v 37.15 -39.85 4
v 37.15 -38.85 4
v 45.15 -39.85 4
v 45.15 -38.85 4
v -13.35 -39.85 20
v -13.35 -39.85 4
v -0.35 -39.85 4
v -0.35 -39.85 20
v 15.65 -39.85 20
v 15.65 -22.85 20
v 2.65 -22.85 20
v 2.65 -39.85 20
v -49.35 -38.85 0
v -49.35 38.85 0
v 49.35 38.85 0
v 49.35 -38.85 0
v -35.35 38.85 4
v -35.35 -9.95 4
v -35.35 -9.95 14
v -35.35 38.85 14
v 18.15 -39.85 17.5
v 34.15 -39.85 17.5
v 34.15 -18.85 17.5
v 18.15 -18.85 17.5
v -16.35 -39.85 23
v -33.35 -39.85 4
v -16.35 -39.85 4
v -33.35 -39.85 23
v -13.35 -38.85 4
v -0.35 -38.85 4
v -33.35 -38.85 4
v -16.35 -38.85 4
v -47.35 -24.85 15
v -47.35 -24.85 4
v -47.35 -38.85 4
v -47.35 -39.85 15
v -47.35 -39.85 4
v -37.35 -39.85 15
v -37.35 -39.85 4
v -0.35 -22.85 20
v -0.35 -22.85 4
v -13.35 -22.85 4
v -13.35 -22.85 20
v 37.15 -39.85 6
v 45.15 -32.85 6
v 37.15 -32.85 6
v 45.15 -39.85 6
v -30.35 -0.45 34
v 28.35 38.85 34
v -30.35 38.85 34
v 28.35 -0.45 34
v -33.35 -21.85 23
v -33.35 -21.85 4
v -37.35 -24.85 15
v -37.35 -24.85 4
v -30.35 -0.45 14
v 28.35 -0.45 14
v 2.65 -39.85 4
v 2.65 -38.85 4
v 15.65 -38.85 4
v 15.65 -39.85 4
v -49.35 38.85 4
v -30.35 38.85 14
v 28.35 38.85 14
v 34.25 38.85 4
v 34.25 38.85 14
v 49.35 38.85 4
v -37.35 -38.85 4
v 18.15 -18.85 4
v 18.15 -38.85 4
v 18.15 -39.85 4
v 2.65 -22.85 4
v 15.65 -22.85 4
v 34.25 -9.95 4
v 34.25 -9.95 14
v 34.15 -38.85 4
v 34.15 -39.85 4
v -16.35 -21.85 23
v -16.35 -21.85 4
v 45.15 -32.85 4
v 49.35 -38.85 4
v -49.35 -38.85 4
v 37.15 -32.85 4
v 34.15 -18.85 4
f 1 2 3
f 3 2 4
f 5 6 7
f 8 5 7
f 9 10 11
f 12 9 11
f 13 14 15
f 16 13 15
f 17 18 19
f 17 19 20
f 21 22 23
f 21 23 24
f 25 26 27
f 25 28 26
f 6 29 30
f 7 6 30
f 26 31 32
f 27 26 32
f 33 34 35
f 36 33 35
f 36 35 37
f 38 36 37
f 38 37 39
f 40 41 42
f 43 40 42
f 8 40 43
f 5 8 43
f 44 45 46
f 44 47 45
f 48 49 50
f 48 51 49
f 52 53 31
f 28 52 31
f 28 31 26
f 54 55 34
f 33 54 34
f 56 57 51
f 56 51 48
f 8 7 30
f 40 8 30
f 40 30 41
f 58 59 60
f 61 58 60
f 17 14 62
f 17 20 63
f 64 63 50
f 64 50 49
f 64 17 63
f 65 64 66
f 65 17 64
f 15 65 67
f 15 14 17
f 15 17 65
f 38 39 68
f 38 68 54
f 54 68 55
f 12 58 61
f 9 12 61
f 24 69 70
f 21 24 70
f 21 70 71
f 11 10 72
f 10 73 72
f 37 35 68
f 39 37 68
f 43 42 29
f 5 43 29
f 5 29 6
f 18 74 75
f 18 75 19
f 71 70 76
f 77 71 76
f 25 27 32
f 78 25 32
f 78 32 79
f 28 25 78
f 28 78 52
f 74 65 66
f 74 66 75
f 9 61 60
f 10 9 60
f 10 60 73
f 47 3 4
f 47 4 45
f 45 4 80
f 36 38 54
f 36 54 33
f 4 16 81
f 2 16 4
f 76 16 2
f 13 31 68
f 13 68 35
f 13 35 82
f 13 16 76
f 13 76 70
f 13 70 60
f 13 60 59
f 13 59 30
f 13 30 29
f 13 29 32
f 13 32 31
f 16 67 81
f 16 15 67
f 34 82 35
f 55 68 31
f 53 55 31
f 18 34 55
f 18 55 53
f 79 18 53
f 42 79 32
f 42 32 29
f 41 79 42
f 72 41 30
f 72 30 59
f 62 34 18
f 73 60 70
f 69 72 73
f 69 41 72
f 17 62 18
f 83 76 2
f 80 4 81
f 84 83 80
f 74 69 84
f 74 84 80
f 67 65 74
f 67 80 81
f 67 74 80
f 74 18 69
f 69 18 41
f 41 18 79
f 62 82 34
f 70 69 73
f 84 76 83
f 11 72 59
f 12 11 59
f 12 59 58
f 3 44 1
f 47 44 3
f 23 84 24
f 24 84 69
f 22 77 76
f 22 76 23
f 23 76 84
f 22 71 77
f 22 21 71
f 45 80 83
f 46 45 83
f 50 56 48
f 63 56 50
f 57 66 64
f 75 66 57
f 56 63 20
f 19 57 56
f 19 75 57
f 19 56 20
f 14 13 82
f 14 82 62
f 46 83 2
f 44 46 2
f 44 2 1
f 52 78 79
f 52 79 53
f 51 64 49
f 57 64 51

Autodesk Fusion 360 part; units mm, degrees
sketch "Sketch1" plane through (0, 0, 0) normal (0, 0, 1) x (1, 0, 0)
  line L0 (49.35, -38.85) -> (-49.35, -38.85)
  line L1 (-49.35, -38.85) -> (-49.35, 38.85)
  line L2 (-49.35, 38.85) -> (49.35, 38.85)
  line L3 (49.35, 38.85) -> (49.35, -38.85)
  line L4 (49.35, -38.85) -> (-49.35, 38.85) construction
  line L5 (-49.35, -38.85) -> (49.35, 38.85) construction
  dimension "d1" = 98.7
  dimension "d2" = 77.7
extrude "Extrude1" add sketch "Sketch1" along normal blind 4
sketch "Sketch2" plane through (0, 0, 4) normal (0, 0, 1) x (-1, 0, 0)
  line L0 (-49.35, -38.85) -> (49.35, -38.85)
  line L1 (49.35, -38.85) -> (49.35, 38.85)
  line L2 (49.35, 38.85) -> (-49.35, 38.85)
  line L3 (-49.35, 38.85) -> (-49.35, -38.85)
  line L4 (35.35, -38.85) -> (-34.25, -38.85)
  line L5 (-34.25, -38.85) -> (-34.25, 9.95)
  line L6 (-34.25, 9.95) -> (35.35, 9.95)
  line L7 (35.35, 9.95) -> (35.35, -38.85)
  dimension "d5" = 69.6
  dimension "d6" = 48.8
  dimension "d7" = 14
extrude "Extrude2" add sketch "Sketch2" along normal blind 10 contours L0 L4 L5 L6 L7
sketch "Sketch3" plane through (0, 0, 14) normal (0, 0, 1) x (-1, 0, 0)
  line L0 (35.35, 9.95) -> (-34.25, 9.95)
  line L1 (-34.25, 9.95) -> (-34.25, -38.85)
  line L2 (-34.25, -38.85) -> (35.35, -38.85)
  line L3 (35.35, -38.85) -> (35.35, 9.95)
  line L4 (30.35, -38.85) -> (-28.35, -38.85)
  line L5 (-28.35, -38.85) -> (-28.35, 0.45)
  line L6 (-28.35, 0.45) -> (30.35, 0.45)
  line L7 (30.35, 0.45) -> (30.35, -38.85)
  dimension "d10" = 39.3
  dimension "d11" = 58.7
  dimension "d12" = 5
extrude "Extrude3" add sketch "Sketch3" along normal blind 20 contours L2 L4 L5 L6 L7
sketch "Sketch4" plane through (0, 0, 4) normal (0, 0, 1) x (-1, 0, 0)
  line L0 (-34.25, -38.85) -> (-34.25, 9.95)
  line L1 (-34.25, 9.95) -> (35.35, 9.95)
  line L2 (35.35, 9.95) -> (35.35, -38.85)
  line L3 (35.35, -38.85) -> (49.35, -38.85)
  line L4 (49.35, -38.85) -> (49.35, 38.85)
  line L5 (49.35, 38.85) -> (-49.35, 38.85)
  line L6 (-49.35, 38.85) -> (-49.35, -38.85)
  line L7 (-49.35, -38.85) -> (-34.25, -38.85)
  line L8 (47.35, 38.85) -> (37.35, 38.85)
  line L9 (37.35, 38.85) -> (37.35, 24.85)
  line L10 (37.35, 24.85) -> (47.35, 24.85)
  line L11 (47.35, 24.85) -> (47.35, 38.85)
  line L12 (33.35, 38.85) -> (16.35, 38.85)
  line L13 (16.35, 38.85) -> (16.35, 21.85)
  line L14 (16.35, 21.85) -> (33.35, 21.85)
  line L15 (33.35, 21.85) -> (33.35, 38.85)
  line L16 (13.35, 38.85) -> (0.35, 38.85)
  line L17 (0.35, 38.85) -> (0.35, 22.85)
  line L18 (0.35, 22.85) -> (13.35, 22.85)
  line L19 (13.35, 22.85) -> (13.35, 38.85)
  line L20 (-2.65, 38.85) -> (-15.65, 38.85)
  line L21 (-15.65, 38.85) -> (-15.65, 22.85)
  line L22 (-15.65, 22.85) -> (-2.65, 22.85)
  line L23 (-2.65, 22.85) -> (-2.65, 38.85)
  line L24 (-18.15, 38.85) -> (-34.15, 38.85)
  line L25 (-34.15, 38.85) -> (-34.15, 18.85)
  line L26 (-34.15, 18.85) -> (-18.15, 18.85)
  line L27 (-18.15, 18.85) -> (-18.15, 38.85)
  line L28 (-37.15, 38.85) -> (-45.15, 38.85)
  line L29 (-45.15, 38.85) -> (-45.15, 32.85)
  line L30 (-45.15, 32.85) -> (-37.15, 32.85)
  line L31 (-37.15, 32.85) -> (-37.15, 38.85)
  dimension "d15" = 10
  dimension "d16" = 14
  dimension "d17" = 17
  dimension "d18" = 17
  dimension "d19" = 2
  dimension "d20" = 4
  dimension "d21" = 13
  dimension "d22" = 16
  dimension "d23" = 13
  dimension "d24" = 16
  dimension "d25" = 3
  dimension "d26" = 3
  dimension "d27" = 16
  dimension "d28" = 20
  dimension "d29" = 2.5
  dimension "d30" = 8
  dimension "d31" = 6
  dimension "d32" = 3
extrude "Extrude4" add sketch "Sketch4" along normal blind 11 contours L5 L8 L9 L10 L11
extrude "Extrude5" add sketch "Sketch4" along normal blind 19 contours L5 L12 L13 L14 L15
extrude "Extrude6" add sketch "Sketch4" along normal blind 16 contours L5 L20 L21 L22 L23 | L5 L16 L17 L18 L19
extrude "Extrude7" add sketch "Sketch4" along normal blind 13.5 contours L5 L24 L25 L26 L27
extrude "Extrude8" add sketch "Sketch4" along normal blind 2 contours L5 L28 L29 L30 L31
sketch "Sketch5" plane through (0, -38.85, 0) normal (0, -1, 0) x (1, 0, 0)
  line L0 (-49.35, 0) -> (49.35, 0)
  line L1 (49.35, 0) -> (49.35, 4)
  line L2 (49.35, 4) -> (45.15, 4)
  line L3 (45.15, 4) -> (45.15, 6)
  line L4 (45.15, 6) -> (37.15, 6)
  line L5 (37.15, 6) -> (37.15, 4)
  line L6 (37.15, 4) -> (34.15, 4)
  line L7 (34.15, 4) -> (34.15, 17.5)
  line L8 (34.15, 17.5) -> (18.15, 17.5)
  line L9 (18.15, 17.5) -> (18.15, 4)
  line L10 (18.15, 4) -> (15.65, 4)
  line L11 (15.65, 4) -> (15.65, 20)
  line L12 (15.65, 20) -> (2.65, 20)
  line L13 (2.65, 20) -> (2.65, 4)
  line L14 (2.65, 4) -> (-0.35, 4)
  line L15 (-0.35, 4) -> (-0.35, 20)
  line L16 (-0.35, 20) -> (-13.35, 20)
  line L17 (-13.35, 20) -> (-13.35, 4)
  line L18 (-13.35, 4) -> (-16.35, 4)
  line L19 (-16.35, 4) -> (-16.35, 23)
  line L20 (-16.35, 23) -> (-33.35, 23)
  line L21 (-33.35, 23) -> (-33.35, 4)
  line L22 (-33.35, 4) -> (-37.35, 4)
  line L23 (-37.35, 4) -> (-37.35, 15)
  line L24 (-37.35, 15) -> (-47.35, 15)
  line L25 (-47.35, 15) -> (-47.35, 4)
  line L26 (-47.35, 4) -> (-49.35, 4)
  line L27 (-49.35, 4) -> (-49.35, 0)
  line L28 (-47.35, 4) -> (-37.35, 4)
  line L29 (-37.35, 4) -> (-37.35, 15)
  line L30 (-37.35, 15) -> (-47.35, 15)
  line L31 (-47.35, 15) -> (-47.35, 4)
  line L32 (-33.35, 4) -> (-16.35, 4)
  line L33 (-16.35, 4) -> (-16.35, 23)
  line L34 (-16.35, 23) -> (-33.35, 23)
  line L35 (-33.35, 23) -> (-33.35, 4)
  line L36 (-13.35, 4) -> (-0.35, 4)
  line L37 (-0.35, 4) -> (-0.35, 20)
  line L38 (-0.35, 20) -> (-13.35, 20)
  line L39 (-13.35, 20) -> (-13.35, 4)
  line L40 (2.65, 4) -> (15.65, 4)
  line L41 (15.65, 4) -> (15.65, 20)
  line L42 (15.65, 20) -> (2.65, 20)
  line L43 (2.65, 20) -> (2.65, 4)
  line L44 (18.15, 4) -> (34.15, 4)
  line L45 (34.15, 4) -> (34.15, 17.5)
  line L46 (34.15, 17.5) -> (18.15, 17.5)
  line L47 (18.15, 17.5) -> (18.15, 4)
  line L48 (37.15, 4) -> (45.15, 4)
  line L49 (45.15, 4) -> (45.15, 6)
  line L50 (45.15, 6) -> (37.15, 6)
  line L51 (37.15, 6) -> (37.15, 4)
extrude "Extrude9" add sketch "Sketch5" along normal blind 1 contours L23 L24 L25 L28 L29 L30 L31 | L3 L4 L5 L48 L49 L50 L51 | L19 L20 L21 L32 L33 L34 L35 | L7 L8 L9 L44 L45 L46 L47 | L15 L16 L17 L36 L37 L38 L39 | L11 L12 L13 L40 L41 L42 L43
